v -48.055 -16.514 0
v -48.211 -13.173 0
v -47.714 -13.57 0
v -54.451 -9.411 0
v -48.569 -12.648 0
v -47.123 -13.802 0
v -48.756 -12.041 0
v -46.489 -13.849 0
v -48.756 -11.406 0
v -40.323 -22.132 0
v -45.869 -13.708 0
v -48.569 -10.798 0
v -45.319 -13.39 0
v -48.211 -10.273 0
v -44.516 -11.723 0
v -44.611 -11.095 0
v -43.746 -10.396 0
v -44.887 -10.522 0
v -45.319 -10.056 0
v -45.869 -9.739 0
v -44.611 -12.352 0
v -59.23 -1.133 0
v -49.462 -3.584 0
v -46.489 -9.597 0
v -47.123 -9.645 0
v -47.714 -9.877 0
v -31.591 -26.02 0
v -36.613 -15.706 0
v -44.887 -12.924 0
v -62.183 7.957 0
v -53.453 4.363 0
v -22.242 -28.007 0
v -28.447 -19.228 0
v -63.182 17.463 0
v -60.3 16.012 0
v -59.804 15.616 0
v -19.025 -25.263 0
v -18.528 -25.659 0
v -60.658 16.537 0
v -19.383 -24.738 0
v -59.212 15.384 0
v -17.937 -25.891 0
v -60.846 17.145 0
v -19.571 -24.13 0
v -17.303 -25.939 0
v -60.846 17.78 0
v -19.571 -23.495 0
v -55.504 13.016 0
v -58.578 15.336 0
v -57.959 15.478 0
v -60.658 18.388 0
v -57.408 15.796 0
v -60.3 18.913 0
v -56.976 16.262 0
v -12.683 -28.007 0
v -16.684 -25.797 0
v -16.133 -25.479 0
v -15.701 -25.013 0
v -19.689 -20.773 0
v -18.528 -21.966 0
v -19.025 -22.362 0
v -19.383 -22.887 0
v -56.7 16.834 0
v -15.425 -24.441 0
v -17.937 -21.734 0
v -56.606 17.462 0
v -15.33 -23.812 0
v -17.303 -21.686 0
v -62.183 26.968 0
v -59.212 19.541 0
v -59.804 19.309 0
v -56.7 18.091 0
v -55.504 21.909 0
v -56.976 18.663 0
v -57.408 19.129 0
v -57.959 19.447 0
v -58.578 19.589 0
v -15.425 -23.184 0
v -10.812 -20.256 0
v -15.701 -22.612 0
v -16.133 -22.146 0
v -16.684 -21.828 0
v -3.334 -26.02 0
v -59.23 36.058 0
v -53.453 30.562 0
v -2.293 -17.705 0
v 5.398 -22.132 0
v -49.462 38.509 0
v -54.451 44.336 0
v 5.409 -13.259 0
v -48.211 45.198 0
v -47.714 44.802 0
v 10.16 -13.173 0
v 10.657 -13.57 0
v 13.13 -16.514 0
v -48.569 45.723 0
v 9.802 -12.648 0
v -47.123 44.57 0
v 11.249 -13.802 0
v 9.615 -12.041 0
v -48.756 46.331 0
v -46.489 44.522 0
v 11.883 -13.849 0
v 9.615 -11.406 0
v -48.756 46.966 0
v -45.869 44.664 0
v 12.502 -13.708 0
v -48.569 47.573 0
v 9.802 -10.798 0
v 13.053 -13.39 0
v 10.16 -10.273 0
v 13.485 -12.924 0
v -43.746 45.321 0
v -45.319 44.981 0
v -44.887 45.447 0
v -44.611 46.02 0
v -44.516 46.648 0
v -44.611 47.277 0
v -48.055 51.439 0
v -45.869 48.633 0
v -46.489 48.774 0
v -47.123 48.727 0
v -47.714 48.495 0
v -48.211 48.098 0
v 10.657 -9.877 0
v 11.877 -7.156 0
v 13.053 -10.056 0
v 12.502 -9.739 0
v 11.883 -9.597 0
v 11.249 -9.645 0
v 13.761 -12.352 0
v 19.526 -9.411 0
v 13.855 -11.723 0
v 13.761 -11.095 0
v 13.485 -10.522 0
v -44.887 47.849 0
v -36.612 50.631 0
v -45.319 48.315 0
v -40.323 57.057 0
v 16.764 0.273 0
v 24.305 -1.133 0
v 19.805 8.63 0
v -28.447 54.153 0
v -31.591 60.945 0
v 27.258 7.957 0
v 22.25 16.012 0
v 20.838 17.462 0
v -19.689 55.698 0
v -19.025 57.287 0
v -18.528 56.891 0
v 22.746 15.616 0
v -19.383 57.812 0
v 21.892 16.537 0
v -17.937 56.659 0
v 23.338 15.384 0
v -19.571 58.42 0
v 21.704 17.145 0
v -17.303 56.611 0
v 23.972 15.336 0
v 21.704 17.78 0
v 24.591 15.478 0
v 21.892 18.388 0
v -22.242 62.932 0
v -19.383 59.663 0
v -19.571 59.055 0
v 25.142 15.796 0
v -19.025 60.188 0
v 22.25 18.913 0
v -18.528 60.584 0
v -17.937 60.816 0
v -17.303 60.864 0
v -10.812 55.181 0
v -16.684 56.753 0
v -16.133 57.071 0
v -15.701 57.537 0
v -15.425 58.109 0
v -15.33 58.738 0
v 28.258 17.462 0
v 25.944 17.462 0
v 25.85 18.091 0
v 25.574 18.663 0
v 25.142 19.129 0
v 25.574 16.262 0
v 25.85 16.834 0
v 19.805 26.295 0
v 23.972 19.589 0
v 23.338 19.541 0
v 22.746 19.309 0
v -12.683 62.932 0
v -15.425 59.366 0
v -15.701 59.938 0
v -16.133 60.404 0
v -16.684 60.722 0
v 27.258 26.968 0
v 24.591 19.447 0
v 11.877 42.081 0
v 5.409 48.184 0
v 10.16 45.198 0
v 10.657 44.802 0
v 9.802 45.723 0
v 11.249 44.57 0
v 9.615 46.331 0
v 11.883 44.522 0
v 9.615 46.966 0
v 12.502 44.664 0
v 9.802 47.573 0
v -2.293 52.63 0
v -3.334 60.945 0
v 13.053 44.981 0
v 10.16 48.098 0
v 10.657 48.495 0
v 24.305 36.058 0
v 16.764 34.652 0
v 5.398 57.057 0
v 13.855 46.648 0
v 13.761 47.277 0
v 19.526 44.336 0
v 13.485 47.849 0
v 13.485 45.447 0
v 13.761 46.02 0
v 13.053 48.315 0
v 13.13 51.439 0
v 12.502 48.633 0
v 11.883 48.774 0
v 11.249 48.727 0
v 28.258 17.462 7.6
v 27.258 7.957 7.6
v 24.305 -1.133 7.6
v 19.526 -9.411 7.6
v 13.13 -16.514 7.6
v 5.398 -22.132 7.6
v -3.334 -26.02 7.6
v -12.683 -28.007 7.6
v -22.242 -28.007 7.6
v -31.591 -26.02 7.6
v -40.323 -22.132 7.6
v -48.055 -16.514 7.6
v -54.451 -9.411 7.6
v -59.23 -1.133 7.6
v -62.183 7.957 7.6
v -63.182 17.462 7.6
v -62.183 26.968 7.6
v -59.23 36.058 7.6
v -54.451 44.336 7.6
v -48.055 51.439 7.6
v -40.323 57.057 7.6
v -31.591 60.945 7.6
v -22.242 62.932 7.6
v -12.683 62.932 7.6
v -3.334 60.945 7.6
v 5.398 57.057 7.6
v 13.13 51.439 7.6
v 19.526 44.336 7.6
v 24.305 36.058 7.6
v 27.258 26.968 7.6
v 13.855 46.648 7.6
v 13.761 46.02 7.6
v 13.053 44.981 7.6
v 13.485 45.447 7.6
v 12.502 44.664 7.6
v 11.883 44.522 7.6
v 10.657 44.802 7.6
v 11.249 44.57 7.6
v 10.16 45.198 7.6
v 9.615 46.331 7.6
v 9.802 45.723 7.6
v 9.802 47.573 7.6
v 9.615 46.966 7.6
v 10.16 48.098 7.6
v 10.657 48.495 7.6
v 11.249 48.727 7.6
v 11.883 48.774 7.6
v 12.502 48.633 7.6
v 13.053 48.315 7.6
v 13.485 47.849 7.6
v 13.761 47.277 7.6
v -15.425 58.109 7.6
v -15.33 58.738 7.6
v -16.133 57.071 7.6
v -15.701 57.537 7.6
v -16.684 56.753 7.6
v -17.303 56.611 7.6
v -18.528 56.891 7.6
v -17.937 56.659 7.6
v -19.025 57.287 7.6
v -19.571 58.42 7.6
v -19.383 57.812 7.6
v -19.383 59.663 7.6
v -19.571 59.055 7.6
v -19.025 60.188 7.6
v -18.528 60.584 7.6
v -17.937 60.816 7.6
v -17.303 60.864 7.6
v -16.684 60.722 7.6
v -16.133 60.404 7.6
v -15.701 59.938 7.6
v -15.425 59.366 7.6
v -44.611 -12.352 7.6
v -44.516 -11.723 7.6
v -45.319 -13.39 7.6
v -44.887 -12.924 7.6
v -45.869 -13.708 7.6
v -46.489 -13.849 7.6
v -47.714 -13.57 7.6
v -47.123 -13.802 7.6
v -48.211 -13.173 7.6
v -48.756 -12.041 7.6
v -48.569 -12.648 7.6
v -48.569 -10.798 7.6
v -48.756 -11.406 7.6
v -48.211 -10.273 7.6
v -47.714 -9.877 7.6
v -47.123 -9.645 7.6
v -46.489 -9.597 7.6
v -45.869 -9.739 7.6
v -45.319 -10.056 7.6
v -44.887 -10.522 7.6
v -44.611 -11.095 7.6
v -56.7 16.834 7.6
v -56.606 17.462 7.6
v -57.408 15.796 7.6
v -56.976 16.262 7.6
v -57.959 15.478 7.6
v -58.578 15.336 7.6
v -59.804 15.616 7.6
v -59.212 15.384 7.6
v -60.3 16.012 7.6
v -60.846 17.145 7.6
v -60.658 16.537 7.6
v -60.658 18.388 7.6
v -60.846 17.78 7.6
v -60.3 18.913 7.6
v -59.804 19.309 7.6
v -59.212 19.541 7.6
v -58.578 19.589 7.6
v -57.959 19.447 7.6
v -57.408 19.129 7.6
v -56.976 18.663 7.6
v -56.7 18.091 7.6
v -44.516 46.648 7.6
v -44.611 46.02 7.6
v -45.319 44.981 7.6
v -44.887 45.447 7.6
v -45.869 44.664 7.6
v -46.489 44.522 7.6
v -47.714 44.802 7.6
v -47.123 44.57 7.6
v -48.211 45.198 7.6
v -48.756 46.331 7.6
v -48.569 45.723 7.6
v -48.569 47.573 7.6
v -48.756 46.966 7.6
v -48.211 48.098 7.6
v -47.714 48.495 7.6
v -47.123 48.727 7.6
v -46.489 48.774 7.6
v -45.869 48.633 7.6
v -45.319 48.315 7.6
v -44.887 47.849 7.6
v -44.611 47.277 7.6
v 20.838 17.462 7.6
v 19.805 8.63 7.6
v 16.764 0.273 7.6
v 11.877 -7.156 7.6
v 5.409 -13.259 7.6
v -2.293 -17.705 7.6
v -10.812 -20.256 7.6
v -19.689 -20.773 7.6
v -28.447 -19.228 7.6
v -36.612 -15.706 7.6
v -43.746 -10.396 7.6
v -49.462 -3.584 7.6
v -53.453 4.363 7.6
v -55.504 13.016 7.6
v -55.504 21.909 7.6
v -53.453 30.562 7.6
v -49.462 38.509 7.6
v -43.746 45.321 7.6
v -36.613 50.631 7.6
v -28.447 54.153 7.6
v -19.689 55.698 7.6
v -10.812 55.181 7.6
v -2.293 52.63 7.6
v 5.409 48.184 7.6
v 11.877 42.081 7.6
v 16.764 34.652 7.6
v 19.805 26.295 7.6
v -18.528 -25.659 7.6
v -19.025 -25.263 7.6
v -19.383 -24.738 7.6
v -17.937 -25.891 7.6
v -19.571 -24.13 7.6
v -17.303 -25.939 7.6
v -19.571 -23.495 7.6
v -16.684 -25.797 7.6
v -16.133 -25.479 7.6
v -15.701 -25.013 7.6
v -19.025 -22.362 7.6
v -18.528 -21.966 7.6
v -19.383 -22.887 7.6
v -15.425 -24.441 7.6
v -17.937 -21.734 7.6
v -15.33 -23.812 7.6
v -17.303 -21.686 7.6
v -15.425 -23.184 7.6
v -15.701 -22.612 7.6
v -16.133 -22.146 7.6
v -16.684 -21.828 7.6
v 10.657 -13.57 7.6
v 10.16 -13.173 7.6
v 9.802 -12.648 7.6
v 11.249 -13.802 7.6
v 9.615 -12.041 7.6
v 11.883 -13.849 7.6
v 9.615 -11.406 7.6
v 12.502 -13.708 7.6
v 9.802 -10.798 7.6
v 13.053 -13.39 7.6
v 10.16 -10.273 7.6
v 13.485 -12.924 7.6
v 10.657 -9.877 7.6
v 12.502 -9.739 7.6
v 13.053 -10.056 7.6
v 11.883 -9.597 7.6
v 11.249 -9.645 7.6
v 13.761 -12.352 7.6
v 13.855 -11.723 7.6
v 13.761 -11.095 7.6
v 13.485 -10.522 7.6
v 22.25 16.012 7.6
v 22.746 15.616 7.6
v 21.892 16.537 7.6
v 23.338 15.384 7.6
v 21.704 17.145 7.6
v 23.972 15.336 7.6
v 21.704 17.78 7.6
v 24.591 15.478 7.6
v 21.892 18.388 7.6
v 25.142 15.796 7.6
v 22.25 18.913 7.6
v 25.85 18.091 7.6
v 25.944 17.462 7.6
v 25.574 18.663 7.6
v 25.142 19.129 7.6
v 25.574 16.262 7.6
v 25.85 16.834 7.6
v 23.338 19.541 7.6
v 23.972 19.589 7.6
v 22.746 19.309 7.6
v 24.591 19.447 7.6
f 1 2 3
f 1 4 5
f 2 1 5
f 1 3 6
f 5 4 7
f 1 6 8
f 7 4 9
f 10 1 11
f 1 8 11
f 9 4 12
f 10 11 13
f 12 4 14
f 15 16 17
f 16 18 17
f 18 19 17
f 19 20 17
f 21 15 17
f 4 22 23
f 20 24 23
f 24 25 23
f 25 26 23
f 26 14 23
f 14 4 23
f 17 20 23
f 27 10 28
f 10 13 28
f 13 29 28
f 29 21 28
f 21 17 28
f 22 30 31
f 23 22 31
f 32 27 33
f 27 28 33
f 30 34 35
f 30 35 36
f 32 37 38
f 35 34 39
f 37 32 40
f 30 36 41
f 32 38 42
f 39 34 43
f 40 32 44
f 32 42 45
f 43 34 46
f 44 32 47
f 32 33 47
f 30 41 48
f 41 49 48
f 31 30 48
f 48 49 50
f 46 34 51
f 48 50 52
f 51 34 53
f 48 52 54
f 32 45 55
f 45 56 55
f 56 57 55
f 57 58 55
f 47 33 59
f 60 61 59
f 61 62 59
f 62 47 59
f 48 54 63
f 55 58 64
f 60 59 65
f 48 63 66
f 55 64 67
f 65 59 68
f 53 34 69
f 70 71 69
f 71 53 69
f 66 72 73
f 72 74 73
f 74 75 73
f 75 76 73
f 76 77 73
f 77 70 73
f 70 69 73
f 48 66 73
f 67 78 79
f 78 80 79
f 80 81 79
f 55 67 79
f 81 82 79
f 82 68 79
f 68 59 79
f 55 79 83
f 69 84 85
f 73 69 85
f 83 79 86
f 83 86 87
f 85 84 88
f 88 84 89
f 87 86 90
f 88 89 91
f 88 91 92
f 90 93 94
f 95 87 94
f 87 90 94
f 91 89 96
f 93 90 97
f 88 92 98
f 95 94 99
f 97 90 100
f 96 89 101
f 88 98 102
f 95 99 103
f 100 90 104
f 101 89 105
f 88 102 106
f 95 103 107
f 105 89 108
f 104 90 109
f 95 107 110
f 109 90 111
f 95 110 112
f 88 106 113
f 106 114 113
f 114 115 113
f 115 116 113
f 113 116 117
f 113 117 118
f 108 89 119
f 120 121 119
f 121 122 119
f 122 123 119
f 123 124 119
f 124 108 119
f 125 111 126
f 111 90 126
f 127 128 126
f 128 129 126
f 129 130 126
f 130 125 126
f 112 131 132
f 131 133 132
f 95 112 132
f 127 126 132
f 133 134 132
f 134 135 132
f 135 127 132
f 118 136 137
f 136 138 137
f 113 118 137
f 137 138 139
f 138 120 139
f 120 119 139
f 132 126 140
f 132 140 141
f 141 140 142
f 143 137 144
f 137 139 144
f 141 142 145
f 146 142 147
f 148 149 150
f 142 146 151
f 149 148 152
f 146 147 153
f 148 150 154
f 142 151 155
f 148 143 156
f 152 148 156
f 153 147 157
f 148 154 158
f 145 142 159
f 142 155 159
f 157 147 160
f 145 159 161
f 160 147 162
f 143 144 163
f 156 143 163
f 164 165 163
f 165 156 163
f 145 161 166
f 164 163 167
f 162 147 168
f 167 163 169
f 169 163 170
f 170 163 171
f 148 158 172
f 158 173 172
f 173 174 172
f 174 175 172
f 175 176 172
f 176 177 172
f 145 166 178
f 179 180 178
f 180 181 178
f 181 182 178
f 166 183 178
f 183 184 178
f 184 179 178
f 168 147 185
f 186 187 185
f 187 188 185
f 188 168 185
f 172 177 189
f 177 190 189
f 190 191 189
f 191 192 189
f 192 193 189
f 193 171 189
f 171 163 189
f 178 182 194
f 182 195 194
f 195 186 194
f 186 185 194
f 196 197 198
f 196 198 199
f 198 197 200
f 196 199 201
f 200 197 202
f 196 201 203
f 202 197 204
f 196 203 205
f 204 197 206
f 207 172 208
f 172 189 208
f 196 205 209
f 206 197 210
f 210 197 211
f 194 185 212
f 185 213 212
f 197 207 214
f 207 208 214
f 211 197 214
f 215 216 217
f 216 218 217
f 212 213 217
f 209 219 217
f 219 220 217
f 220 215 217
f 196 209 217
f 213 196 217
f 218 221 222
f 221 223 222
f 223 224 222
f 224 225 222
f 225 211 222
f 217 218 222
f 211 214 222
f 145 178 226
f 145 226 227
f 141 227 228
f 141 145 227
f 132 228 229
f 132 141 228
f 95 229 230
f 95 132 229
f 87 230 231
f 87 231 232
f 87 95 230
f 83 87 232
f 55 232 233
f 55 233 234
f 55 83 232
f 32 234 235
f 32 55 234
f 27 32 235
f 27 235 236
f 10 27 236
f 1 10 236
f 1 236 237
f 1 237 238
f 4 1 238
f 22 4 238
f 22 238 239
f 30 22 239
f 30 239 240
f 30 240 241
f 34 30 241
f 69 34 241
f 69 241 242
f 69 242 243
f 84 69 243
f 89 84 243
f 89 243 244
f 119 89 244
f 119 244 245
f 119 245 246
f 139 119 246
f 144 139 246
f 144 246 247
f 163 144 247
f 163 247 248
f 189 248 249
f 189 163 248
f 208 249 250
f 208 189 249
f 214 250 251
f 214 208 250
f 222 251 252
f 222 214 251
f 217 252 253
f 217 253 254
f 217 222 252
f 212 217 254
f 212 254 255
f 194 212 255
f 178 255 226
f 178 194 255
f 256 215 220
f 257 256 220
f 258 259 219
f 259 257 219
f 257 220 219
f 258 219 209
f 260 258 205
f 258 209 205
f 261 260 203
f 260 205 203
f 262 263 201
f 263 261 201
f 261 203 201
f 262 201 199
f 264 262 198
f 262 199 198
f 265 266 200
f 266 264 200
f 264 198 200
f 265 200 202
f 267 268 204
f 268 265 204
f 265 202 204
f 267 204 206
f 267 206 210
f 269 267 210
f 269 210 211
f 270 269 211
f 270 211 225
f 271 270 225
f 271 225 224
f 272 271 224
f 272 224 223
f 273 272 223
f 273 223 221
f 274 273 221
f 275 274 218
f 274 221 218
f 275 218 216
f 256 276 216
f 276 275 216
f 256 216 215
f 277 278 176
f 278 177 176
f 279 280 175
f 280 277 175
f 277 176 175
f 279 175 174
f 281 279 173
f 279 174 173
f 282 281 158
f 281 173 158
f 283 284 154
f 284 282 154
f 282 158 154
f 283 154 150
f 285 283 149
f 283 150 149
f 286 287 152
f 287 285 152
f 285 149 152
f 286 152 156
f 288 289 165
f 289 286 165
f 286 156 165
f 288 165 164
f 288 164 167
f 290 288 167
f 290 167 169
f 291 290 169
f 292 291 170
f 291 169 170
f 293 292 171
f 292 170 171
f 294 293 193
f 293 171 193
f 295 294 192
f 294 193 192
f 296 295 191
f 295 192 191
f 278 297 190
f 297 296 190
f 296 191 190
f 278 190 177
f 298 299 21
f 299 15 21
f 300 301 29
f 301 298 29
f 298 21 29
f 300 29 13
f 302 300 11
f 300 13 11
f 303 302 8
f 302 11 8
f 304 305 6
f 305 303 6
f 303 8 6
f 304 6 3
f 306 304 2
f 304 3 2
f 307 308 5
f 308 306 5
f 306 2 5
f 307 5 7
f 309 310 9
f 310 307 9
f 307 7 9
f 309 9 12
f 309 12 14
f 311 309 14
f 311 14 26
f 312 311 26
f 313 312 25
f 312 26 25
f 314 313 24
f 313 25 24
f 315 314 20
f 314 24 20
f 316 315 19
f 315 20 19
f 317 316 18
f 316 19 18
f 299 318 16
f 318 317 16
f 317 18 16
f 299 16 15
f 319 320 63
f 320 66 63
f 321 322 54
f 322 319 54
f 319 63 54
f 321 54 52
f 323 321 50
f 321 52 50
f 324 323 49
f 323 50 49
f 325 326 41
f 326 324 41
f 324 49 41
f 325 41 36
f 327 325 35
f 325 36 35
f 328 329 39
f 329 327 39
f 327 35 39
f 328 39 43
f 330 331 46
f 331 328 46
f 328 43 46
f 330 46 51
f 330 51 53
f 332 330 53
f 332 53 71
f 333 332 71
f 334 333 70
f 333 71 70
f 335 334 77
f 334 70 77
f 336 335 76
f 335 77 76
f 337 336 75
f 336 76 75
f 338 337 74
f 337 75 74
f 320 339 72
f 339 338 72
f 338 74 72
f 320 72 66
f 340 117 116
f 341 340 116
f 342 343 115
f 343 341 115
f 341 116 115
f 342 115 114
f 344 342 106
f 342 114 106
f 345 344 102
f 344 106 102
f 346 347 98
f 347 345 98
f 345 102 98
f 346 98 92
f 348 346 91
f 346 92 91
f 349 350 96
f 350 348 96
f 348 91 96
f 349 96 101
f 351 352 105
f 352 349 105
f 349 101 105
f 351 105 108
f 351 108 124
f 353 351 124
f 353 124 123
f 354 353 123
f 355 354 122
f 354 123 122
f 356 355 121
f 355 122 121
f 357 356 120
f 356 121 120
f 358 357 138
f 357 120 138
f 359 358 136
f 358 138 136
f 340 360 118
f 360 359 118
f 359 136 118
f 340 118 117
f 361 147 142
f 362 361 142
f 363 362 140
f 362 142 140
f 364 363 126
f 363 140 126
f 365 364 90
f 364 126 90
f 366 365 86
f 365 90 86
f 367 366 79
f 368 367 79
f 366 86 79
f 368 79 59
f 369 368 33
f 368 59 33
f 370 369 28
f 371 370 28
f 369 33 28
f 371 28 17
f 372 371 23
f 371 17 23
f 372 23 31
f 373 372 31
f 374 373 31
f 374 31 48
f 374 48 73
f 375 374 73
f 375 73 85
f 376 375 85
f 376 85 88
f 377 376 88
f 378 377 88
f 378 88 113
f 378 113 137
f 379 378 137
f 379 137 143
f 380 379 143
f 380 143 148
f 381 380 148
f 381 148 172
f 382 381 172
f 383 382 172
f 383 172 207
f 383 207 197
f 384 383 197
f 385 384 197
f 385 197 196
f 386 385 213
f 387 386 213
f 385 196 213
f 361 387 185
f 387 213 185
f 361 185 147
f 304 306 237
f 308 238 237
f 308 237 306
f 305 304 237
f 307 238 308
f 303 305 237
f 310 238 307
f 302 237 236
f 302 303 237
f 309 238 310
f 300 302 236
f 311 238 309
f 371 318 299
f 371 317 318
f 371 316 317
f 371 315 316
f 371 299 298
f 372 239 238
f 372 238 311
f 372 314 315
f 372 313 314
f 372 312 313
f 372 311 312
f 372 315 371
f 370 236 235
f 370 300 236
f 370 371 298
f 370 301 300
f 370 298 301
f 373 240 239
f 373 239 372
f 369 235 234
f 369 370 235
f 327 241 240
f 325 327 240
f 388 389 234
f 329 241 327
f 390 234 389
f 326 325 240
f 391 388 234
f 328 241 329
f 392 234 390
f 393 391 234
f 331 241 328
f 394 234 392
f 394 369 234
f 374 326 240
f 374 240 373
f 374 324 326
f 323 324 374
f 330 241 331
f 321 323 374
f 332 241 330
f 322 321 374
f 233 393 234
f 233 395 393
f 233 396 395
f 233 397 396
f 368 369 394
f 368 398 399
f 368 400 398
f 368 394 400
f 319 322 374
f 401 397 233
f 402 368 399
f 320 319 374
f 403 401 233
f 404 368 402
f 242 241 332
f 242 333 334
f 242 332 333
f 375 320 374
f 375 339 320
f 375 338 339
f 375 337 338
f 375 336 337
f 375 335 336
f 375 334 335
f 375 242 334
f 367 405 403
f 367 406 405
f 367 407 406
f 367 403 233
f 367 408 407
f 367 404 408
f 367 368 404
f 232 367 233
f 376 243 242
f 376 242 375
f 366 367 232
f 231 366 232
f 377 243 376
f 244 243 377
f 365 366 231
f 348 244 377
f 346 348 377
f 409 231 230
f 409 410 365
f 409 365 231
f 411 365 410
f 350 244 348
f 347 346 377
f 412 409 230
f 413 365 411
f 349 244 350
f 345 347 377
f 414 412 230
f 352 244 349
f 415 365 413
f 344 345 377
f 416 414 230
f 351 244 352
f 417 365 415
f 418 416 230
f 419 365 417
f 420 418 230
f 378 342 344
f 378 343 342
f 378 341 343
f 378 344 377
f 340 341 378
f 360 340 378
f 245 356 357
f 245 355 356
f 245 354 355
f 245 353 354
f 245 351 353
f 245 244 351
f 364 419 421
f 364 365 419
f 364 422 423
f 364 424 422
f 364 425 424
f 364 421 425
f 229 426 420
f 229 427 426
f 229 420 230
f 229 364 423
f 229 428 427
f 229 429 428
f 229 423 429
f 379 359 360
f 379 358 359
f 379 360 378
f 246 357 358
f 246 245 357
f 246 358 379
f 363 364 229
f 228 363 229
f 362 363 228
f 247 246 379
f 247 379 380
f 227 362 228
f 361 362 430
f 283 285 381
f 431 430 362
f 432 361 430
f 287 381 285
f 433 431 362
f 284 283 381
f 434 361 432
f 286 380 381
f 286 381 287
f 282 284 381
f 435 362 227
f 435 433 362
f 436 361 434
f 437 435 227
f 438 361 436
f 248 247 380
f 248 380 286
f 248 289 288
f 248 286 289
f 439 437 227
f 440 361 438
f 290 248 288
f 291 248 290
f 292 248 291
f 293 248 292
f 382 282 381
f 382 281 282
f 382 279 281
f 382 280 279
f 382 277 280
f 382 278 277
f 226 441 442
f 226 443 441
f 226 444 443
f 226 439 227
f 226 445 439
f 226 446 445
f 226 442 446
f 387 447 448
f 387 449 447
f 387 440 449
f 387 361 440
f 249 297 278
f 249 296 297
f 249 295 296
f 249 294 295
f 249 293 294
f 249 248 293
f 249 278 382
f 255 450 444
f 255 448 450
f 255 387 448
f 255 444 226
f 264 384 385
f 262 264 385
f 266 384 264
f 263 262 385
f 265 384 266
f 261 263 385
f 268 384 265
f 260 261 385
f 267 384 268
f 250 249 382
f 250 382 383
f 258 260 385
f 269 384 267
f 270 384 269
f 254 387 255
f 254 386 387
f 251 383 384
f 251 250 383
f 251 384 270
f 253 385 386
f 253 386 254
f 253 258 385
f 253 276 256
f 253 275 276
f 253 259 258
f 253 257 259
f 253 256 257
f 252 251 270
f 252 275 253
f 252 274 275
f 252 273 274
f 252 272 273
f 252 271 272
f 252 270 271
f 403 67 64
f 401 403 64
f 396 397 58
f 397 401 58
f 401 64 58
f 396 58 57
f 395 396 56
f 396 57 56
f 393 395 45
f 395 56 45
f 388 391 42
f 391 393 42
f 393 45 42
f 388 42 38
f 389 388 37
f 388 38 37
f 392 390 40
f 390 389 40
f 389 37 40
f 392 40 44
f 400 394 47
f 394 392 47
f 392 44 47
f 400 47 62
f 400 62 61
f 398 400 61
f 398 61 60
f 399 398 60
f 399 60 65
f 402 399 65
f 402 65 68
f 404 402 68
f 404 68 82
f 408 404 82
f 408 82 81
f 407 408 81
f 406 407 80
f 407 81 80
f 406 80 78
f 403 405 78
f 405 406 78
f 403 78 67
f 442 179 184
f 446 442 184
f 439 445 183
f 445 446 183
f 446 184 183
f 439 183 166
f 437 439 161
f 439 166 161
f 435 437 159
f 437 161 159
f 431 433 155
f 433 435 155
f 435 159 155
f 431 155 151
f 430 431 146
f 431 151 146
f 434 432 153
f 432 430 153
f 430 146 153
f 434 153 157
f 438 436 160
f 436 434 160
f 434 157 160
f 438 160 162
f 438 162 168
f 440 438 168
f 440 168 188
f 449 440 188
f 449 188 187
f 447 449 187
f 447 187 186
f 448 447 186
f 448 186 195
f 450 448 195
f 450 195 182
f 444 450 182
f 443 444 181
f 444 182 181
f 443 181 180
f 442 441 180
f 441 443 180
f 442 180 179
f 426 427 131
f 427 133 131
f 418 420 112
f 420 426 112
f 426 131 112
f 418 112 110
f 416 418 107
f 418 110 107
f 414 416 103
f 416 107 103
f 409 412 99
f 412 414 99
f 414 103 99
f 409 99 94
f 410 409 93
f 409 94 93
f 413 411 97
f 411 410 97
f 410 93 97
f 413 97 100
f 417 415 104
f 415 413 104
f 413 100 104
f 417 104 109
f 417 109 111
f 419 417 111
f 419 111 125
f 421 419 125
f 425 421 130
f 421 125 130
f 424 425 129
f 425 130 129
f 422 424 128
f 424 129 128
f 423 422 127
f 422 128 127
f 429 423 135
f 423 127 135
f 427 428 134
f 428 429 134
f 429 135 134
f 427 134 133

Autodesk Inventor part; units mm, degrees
ref_plane "YZ Plane" through (0, 0, 0) normal (1, 0, 0) x (0, 1, 0)
ref_plane "XZ Plane" through (0, 0, 0) normal (0, 1, 0) x (-1, 0, 0)
ref_plane "XY Plane" through (0, 0, 0) normal (0, 0, 1) x (1, 0, 0)
ref_plane "Work Plane1" through (0, 0, 0) normal (0, 0, 1) x (1, 0, 0)
sketch "Sketch1" plane through (0, 0, 0) normal (0, 0, 1) x (1, 0, 0)
  circle A0 centre (11.7233, 46.6483) radius 2.132 projected
  circle A1 centre (20.0025, 56.1975) radius 2.132 projected
  circle A2 centre (32.7025, 56.1975) radius 2.132 projected
  circle A3 centre (45.4025, 56.1975) radius 2.132 projected
  circle A4 centre (58.1025, 56.1975) radius 2.132 projected
  circle A5 centre (-58.7375, 17.4625) radius 2.132 projected
  circle A6 centre (-46.6483, 46.6483) radius 2.132 projected
  circle A7 centre (-17.4625, 58.7375) radius 2.132 projected
  circle A8 centre (11.7233, 46.6483) radius 2.132 projected
  circle A9 centre (23.8125, 17.4625) radius 2.132 projected
  circle A10 centre (11.7233, -11.7233) radius 2.132 projected
  circle A11 centre (-17.4625, -23.8125) radius 2.132 projected
  circle A12 centre (-46.6483, -11.7233) radius 2.132 projected
  circle A13 centre (-56.1975, -32.7025) radius 2.132 projected
  circle A14 centre (-56.1975, -45.4025) radius 2.132 projected
  circle A15 centre (-56.1975, -58.1025) radius 2.132 projected
  circle A16 centre (-56.1975, -20.0025) radius 2.132 projected
  circle A17 centre (-17.4625, 17.4625) radius 38.1 projected
  circle A18 centre (-17.4625, 17.4625) radius 38.3
  circle A19 centre (-17.4625, 17.4625) radius 45.72
  circle A20 centre (-17.4625, 17.4625) radius 32.55 projected
  line L0 (9.485, -18.7266) -> (-48.7269, -62.0728) projected
  arc A21 (9.485, -18.7266) -> (18.7266, -9.485) centre (-17.4625, 17.4625) ccw projected
  line L1 (62.0728, 48.7269) -> (18.7266, -9.485) projected
  arc A22 (62.0728, 48.7269) -> (62.5825, 50.2648) centre (60.0075, 50.2648) ccw projected
  line L2 (62.5825, 60.0075) -> (62.5825, 50.2648) projected
  arc A23 (62.5825, 60.0075) -> (60.0075, 62.5825) centre (60.0075, 60.0075) ccw projected
  line L3 (-17.4625, 62.5825) -> (60.0075, 62.5825) projected
  arc A24 (-17.4625, 62.5825) -> (-62.5825, 17.4625) centre (-17.4625, 17.4625) ccw projected
  line L4 (-62.5825, -60.0075) -> (-62.5825, 17.4625) projected
  arc A25 (-62.5825, -60.0075) -> (-60.0075, -62.5825) centre (-60.0075, -60.0075) ccw projected
  line L5 (-50.2648, -62.5825) -> (-60.0075, -62.5825) projected
  arc A26 (-50.2648, -62.5825) -> (-48.7269, -62.0728) centre (-50.2648, -60.0075) ccw projected
  arc A27 (-46.4955, -21.6632) -> (-38.635, -17.6063) centre (-46.6483, -11.7233) ccw projected
  arc A28 (-33.9418, -16.445) -> (-38.635, -17.6063) centre (-35.592, -19.8403) ccw projected
  arc A29 (-33.9418, -16.445) -> (-29.7861, -18.1664) centre (-17.4625, 17.4625) ccw projected
  arc A30 (-27.2887, -22.3061) -> (-29.7861, -18.1664) centre (-31.0201, -21.734) ccw projected
  arc A31 (-27.2887, -22.3061) -> (-26.8535, -27.0731) centre (-17.4625, -23.8125) ccw projected
  arc A32 (-28.1651, -31.3391) -> (-26.8535, -27.0731) centre (-30.4197, -28.3113) ccw projected
  line L6 (-44.1828, -43.2664) -> (-28.1651, -31.3391) projected
  arc A33 (-50.2124, -40.2386) -> (-44.1828, -43.2664) centre (-46.4374, -40.2386) ccw projected
  line L7 (-50.2124, -25.4377) -> (-50.2124, -40.2386) projected
  arc A34 (-46.4955, -21.6632) -> (-50.2124, -25.4377) centre (-46.4374, -25.4377) ccw projected
  line L8 (40.2386, 50.2124) -> (25.4377, 50.2124) projected
  arc A35 (43.2664, 44.1828) -> (40.2386, 50.2124) centre (40.2386, 46.4374) ccw projected
  line L9 (31.3391, 28.1651) -> (43.2664, 44.1828) projected
  arc A36 (27.0731, 26.8535) -> (31.3391, 28.1651) centre (28.3113, 30.4197) ccw projected
  arc A37 (27.0731, 26.8535) -> (22.3061, 27.2887) centre (23.8125, 17.4625) ccw projected
  arc A38 (18.1664, 29.7861) -> (22.3061, 27.2887) centre (21.734, 31.0201) ccw projected
  arc A39 (18.1664, 29.7861) -> (16.445, 33.9418) centre (-17.4625, 17.4625) ccw projected
  arc A40 (17.6063, 38.635) -> (16.445, 33.9418) centre (19.8403, 35.592) ccw projected
  arc A41 (17.6063, 38.635) -> (21.6632, 46.4955) centre (11.7233, 46.6483) ccw projected
  arc A42 (25.4377, 50.2124) -> (21.6632, 46.4955) centre (25.4377, 46.4374) ccw projected
  point P0 (0, 0)
  dimension "d0" = 0.2
extrude "Extrusion1" add sketch "Sketch1" along normal blind 7.6 contours A38 A37 A36 A19 L1 A21 L0 A32 A31 A30 A18 | A18 A40 A41 A19 A36 A37 A38 | A30 A31 A32 A19 A27 A28 A18 | A18 A28 A27 A19 L4 A24 L3 A41 A40 | L3 A24 L4 A19 | L0 A21 L1 A19
properties part number "upper_plate"
